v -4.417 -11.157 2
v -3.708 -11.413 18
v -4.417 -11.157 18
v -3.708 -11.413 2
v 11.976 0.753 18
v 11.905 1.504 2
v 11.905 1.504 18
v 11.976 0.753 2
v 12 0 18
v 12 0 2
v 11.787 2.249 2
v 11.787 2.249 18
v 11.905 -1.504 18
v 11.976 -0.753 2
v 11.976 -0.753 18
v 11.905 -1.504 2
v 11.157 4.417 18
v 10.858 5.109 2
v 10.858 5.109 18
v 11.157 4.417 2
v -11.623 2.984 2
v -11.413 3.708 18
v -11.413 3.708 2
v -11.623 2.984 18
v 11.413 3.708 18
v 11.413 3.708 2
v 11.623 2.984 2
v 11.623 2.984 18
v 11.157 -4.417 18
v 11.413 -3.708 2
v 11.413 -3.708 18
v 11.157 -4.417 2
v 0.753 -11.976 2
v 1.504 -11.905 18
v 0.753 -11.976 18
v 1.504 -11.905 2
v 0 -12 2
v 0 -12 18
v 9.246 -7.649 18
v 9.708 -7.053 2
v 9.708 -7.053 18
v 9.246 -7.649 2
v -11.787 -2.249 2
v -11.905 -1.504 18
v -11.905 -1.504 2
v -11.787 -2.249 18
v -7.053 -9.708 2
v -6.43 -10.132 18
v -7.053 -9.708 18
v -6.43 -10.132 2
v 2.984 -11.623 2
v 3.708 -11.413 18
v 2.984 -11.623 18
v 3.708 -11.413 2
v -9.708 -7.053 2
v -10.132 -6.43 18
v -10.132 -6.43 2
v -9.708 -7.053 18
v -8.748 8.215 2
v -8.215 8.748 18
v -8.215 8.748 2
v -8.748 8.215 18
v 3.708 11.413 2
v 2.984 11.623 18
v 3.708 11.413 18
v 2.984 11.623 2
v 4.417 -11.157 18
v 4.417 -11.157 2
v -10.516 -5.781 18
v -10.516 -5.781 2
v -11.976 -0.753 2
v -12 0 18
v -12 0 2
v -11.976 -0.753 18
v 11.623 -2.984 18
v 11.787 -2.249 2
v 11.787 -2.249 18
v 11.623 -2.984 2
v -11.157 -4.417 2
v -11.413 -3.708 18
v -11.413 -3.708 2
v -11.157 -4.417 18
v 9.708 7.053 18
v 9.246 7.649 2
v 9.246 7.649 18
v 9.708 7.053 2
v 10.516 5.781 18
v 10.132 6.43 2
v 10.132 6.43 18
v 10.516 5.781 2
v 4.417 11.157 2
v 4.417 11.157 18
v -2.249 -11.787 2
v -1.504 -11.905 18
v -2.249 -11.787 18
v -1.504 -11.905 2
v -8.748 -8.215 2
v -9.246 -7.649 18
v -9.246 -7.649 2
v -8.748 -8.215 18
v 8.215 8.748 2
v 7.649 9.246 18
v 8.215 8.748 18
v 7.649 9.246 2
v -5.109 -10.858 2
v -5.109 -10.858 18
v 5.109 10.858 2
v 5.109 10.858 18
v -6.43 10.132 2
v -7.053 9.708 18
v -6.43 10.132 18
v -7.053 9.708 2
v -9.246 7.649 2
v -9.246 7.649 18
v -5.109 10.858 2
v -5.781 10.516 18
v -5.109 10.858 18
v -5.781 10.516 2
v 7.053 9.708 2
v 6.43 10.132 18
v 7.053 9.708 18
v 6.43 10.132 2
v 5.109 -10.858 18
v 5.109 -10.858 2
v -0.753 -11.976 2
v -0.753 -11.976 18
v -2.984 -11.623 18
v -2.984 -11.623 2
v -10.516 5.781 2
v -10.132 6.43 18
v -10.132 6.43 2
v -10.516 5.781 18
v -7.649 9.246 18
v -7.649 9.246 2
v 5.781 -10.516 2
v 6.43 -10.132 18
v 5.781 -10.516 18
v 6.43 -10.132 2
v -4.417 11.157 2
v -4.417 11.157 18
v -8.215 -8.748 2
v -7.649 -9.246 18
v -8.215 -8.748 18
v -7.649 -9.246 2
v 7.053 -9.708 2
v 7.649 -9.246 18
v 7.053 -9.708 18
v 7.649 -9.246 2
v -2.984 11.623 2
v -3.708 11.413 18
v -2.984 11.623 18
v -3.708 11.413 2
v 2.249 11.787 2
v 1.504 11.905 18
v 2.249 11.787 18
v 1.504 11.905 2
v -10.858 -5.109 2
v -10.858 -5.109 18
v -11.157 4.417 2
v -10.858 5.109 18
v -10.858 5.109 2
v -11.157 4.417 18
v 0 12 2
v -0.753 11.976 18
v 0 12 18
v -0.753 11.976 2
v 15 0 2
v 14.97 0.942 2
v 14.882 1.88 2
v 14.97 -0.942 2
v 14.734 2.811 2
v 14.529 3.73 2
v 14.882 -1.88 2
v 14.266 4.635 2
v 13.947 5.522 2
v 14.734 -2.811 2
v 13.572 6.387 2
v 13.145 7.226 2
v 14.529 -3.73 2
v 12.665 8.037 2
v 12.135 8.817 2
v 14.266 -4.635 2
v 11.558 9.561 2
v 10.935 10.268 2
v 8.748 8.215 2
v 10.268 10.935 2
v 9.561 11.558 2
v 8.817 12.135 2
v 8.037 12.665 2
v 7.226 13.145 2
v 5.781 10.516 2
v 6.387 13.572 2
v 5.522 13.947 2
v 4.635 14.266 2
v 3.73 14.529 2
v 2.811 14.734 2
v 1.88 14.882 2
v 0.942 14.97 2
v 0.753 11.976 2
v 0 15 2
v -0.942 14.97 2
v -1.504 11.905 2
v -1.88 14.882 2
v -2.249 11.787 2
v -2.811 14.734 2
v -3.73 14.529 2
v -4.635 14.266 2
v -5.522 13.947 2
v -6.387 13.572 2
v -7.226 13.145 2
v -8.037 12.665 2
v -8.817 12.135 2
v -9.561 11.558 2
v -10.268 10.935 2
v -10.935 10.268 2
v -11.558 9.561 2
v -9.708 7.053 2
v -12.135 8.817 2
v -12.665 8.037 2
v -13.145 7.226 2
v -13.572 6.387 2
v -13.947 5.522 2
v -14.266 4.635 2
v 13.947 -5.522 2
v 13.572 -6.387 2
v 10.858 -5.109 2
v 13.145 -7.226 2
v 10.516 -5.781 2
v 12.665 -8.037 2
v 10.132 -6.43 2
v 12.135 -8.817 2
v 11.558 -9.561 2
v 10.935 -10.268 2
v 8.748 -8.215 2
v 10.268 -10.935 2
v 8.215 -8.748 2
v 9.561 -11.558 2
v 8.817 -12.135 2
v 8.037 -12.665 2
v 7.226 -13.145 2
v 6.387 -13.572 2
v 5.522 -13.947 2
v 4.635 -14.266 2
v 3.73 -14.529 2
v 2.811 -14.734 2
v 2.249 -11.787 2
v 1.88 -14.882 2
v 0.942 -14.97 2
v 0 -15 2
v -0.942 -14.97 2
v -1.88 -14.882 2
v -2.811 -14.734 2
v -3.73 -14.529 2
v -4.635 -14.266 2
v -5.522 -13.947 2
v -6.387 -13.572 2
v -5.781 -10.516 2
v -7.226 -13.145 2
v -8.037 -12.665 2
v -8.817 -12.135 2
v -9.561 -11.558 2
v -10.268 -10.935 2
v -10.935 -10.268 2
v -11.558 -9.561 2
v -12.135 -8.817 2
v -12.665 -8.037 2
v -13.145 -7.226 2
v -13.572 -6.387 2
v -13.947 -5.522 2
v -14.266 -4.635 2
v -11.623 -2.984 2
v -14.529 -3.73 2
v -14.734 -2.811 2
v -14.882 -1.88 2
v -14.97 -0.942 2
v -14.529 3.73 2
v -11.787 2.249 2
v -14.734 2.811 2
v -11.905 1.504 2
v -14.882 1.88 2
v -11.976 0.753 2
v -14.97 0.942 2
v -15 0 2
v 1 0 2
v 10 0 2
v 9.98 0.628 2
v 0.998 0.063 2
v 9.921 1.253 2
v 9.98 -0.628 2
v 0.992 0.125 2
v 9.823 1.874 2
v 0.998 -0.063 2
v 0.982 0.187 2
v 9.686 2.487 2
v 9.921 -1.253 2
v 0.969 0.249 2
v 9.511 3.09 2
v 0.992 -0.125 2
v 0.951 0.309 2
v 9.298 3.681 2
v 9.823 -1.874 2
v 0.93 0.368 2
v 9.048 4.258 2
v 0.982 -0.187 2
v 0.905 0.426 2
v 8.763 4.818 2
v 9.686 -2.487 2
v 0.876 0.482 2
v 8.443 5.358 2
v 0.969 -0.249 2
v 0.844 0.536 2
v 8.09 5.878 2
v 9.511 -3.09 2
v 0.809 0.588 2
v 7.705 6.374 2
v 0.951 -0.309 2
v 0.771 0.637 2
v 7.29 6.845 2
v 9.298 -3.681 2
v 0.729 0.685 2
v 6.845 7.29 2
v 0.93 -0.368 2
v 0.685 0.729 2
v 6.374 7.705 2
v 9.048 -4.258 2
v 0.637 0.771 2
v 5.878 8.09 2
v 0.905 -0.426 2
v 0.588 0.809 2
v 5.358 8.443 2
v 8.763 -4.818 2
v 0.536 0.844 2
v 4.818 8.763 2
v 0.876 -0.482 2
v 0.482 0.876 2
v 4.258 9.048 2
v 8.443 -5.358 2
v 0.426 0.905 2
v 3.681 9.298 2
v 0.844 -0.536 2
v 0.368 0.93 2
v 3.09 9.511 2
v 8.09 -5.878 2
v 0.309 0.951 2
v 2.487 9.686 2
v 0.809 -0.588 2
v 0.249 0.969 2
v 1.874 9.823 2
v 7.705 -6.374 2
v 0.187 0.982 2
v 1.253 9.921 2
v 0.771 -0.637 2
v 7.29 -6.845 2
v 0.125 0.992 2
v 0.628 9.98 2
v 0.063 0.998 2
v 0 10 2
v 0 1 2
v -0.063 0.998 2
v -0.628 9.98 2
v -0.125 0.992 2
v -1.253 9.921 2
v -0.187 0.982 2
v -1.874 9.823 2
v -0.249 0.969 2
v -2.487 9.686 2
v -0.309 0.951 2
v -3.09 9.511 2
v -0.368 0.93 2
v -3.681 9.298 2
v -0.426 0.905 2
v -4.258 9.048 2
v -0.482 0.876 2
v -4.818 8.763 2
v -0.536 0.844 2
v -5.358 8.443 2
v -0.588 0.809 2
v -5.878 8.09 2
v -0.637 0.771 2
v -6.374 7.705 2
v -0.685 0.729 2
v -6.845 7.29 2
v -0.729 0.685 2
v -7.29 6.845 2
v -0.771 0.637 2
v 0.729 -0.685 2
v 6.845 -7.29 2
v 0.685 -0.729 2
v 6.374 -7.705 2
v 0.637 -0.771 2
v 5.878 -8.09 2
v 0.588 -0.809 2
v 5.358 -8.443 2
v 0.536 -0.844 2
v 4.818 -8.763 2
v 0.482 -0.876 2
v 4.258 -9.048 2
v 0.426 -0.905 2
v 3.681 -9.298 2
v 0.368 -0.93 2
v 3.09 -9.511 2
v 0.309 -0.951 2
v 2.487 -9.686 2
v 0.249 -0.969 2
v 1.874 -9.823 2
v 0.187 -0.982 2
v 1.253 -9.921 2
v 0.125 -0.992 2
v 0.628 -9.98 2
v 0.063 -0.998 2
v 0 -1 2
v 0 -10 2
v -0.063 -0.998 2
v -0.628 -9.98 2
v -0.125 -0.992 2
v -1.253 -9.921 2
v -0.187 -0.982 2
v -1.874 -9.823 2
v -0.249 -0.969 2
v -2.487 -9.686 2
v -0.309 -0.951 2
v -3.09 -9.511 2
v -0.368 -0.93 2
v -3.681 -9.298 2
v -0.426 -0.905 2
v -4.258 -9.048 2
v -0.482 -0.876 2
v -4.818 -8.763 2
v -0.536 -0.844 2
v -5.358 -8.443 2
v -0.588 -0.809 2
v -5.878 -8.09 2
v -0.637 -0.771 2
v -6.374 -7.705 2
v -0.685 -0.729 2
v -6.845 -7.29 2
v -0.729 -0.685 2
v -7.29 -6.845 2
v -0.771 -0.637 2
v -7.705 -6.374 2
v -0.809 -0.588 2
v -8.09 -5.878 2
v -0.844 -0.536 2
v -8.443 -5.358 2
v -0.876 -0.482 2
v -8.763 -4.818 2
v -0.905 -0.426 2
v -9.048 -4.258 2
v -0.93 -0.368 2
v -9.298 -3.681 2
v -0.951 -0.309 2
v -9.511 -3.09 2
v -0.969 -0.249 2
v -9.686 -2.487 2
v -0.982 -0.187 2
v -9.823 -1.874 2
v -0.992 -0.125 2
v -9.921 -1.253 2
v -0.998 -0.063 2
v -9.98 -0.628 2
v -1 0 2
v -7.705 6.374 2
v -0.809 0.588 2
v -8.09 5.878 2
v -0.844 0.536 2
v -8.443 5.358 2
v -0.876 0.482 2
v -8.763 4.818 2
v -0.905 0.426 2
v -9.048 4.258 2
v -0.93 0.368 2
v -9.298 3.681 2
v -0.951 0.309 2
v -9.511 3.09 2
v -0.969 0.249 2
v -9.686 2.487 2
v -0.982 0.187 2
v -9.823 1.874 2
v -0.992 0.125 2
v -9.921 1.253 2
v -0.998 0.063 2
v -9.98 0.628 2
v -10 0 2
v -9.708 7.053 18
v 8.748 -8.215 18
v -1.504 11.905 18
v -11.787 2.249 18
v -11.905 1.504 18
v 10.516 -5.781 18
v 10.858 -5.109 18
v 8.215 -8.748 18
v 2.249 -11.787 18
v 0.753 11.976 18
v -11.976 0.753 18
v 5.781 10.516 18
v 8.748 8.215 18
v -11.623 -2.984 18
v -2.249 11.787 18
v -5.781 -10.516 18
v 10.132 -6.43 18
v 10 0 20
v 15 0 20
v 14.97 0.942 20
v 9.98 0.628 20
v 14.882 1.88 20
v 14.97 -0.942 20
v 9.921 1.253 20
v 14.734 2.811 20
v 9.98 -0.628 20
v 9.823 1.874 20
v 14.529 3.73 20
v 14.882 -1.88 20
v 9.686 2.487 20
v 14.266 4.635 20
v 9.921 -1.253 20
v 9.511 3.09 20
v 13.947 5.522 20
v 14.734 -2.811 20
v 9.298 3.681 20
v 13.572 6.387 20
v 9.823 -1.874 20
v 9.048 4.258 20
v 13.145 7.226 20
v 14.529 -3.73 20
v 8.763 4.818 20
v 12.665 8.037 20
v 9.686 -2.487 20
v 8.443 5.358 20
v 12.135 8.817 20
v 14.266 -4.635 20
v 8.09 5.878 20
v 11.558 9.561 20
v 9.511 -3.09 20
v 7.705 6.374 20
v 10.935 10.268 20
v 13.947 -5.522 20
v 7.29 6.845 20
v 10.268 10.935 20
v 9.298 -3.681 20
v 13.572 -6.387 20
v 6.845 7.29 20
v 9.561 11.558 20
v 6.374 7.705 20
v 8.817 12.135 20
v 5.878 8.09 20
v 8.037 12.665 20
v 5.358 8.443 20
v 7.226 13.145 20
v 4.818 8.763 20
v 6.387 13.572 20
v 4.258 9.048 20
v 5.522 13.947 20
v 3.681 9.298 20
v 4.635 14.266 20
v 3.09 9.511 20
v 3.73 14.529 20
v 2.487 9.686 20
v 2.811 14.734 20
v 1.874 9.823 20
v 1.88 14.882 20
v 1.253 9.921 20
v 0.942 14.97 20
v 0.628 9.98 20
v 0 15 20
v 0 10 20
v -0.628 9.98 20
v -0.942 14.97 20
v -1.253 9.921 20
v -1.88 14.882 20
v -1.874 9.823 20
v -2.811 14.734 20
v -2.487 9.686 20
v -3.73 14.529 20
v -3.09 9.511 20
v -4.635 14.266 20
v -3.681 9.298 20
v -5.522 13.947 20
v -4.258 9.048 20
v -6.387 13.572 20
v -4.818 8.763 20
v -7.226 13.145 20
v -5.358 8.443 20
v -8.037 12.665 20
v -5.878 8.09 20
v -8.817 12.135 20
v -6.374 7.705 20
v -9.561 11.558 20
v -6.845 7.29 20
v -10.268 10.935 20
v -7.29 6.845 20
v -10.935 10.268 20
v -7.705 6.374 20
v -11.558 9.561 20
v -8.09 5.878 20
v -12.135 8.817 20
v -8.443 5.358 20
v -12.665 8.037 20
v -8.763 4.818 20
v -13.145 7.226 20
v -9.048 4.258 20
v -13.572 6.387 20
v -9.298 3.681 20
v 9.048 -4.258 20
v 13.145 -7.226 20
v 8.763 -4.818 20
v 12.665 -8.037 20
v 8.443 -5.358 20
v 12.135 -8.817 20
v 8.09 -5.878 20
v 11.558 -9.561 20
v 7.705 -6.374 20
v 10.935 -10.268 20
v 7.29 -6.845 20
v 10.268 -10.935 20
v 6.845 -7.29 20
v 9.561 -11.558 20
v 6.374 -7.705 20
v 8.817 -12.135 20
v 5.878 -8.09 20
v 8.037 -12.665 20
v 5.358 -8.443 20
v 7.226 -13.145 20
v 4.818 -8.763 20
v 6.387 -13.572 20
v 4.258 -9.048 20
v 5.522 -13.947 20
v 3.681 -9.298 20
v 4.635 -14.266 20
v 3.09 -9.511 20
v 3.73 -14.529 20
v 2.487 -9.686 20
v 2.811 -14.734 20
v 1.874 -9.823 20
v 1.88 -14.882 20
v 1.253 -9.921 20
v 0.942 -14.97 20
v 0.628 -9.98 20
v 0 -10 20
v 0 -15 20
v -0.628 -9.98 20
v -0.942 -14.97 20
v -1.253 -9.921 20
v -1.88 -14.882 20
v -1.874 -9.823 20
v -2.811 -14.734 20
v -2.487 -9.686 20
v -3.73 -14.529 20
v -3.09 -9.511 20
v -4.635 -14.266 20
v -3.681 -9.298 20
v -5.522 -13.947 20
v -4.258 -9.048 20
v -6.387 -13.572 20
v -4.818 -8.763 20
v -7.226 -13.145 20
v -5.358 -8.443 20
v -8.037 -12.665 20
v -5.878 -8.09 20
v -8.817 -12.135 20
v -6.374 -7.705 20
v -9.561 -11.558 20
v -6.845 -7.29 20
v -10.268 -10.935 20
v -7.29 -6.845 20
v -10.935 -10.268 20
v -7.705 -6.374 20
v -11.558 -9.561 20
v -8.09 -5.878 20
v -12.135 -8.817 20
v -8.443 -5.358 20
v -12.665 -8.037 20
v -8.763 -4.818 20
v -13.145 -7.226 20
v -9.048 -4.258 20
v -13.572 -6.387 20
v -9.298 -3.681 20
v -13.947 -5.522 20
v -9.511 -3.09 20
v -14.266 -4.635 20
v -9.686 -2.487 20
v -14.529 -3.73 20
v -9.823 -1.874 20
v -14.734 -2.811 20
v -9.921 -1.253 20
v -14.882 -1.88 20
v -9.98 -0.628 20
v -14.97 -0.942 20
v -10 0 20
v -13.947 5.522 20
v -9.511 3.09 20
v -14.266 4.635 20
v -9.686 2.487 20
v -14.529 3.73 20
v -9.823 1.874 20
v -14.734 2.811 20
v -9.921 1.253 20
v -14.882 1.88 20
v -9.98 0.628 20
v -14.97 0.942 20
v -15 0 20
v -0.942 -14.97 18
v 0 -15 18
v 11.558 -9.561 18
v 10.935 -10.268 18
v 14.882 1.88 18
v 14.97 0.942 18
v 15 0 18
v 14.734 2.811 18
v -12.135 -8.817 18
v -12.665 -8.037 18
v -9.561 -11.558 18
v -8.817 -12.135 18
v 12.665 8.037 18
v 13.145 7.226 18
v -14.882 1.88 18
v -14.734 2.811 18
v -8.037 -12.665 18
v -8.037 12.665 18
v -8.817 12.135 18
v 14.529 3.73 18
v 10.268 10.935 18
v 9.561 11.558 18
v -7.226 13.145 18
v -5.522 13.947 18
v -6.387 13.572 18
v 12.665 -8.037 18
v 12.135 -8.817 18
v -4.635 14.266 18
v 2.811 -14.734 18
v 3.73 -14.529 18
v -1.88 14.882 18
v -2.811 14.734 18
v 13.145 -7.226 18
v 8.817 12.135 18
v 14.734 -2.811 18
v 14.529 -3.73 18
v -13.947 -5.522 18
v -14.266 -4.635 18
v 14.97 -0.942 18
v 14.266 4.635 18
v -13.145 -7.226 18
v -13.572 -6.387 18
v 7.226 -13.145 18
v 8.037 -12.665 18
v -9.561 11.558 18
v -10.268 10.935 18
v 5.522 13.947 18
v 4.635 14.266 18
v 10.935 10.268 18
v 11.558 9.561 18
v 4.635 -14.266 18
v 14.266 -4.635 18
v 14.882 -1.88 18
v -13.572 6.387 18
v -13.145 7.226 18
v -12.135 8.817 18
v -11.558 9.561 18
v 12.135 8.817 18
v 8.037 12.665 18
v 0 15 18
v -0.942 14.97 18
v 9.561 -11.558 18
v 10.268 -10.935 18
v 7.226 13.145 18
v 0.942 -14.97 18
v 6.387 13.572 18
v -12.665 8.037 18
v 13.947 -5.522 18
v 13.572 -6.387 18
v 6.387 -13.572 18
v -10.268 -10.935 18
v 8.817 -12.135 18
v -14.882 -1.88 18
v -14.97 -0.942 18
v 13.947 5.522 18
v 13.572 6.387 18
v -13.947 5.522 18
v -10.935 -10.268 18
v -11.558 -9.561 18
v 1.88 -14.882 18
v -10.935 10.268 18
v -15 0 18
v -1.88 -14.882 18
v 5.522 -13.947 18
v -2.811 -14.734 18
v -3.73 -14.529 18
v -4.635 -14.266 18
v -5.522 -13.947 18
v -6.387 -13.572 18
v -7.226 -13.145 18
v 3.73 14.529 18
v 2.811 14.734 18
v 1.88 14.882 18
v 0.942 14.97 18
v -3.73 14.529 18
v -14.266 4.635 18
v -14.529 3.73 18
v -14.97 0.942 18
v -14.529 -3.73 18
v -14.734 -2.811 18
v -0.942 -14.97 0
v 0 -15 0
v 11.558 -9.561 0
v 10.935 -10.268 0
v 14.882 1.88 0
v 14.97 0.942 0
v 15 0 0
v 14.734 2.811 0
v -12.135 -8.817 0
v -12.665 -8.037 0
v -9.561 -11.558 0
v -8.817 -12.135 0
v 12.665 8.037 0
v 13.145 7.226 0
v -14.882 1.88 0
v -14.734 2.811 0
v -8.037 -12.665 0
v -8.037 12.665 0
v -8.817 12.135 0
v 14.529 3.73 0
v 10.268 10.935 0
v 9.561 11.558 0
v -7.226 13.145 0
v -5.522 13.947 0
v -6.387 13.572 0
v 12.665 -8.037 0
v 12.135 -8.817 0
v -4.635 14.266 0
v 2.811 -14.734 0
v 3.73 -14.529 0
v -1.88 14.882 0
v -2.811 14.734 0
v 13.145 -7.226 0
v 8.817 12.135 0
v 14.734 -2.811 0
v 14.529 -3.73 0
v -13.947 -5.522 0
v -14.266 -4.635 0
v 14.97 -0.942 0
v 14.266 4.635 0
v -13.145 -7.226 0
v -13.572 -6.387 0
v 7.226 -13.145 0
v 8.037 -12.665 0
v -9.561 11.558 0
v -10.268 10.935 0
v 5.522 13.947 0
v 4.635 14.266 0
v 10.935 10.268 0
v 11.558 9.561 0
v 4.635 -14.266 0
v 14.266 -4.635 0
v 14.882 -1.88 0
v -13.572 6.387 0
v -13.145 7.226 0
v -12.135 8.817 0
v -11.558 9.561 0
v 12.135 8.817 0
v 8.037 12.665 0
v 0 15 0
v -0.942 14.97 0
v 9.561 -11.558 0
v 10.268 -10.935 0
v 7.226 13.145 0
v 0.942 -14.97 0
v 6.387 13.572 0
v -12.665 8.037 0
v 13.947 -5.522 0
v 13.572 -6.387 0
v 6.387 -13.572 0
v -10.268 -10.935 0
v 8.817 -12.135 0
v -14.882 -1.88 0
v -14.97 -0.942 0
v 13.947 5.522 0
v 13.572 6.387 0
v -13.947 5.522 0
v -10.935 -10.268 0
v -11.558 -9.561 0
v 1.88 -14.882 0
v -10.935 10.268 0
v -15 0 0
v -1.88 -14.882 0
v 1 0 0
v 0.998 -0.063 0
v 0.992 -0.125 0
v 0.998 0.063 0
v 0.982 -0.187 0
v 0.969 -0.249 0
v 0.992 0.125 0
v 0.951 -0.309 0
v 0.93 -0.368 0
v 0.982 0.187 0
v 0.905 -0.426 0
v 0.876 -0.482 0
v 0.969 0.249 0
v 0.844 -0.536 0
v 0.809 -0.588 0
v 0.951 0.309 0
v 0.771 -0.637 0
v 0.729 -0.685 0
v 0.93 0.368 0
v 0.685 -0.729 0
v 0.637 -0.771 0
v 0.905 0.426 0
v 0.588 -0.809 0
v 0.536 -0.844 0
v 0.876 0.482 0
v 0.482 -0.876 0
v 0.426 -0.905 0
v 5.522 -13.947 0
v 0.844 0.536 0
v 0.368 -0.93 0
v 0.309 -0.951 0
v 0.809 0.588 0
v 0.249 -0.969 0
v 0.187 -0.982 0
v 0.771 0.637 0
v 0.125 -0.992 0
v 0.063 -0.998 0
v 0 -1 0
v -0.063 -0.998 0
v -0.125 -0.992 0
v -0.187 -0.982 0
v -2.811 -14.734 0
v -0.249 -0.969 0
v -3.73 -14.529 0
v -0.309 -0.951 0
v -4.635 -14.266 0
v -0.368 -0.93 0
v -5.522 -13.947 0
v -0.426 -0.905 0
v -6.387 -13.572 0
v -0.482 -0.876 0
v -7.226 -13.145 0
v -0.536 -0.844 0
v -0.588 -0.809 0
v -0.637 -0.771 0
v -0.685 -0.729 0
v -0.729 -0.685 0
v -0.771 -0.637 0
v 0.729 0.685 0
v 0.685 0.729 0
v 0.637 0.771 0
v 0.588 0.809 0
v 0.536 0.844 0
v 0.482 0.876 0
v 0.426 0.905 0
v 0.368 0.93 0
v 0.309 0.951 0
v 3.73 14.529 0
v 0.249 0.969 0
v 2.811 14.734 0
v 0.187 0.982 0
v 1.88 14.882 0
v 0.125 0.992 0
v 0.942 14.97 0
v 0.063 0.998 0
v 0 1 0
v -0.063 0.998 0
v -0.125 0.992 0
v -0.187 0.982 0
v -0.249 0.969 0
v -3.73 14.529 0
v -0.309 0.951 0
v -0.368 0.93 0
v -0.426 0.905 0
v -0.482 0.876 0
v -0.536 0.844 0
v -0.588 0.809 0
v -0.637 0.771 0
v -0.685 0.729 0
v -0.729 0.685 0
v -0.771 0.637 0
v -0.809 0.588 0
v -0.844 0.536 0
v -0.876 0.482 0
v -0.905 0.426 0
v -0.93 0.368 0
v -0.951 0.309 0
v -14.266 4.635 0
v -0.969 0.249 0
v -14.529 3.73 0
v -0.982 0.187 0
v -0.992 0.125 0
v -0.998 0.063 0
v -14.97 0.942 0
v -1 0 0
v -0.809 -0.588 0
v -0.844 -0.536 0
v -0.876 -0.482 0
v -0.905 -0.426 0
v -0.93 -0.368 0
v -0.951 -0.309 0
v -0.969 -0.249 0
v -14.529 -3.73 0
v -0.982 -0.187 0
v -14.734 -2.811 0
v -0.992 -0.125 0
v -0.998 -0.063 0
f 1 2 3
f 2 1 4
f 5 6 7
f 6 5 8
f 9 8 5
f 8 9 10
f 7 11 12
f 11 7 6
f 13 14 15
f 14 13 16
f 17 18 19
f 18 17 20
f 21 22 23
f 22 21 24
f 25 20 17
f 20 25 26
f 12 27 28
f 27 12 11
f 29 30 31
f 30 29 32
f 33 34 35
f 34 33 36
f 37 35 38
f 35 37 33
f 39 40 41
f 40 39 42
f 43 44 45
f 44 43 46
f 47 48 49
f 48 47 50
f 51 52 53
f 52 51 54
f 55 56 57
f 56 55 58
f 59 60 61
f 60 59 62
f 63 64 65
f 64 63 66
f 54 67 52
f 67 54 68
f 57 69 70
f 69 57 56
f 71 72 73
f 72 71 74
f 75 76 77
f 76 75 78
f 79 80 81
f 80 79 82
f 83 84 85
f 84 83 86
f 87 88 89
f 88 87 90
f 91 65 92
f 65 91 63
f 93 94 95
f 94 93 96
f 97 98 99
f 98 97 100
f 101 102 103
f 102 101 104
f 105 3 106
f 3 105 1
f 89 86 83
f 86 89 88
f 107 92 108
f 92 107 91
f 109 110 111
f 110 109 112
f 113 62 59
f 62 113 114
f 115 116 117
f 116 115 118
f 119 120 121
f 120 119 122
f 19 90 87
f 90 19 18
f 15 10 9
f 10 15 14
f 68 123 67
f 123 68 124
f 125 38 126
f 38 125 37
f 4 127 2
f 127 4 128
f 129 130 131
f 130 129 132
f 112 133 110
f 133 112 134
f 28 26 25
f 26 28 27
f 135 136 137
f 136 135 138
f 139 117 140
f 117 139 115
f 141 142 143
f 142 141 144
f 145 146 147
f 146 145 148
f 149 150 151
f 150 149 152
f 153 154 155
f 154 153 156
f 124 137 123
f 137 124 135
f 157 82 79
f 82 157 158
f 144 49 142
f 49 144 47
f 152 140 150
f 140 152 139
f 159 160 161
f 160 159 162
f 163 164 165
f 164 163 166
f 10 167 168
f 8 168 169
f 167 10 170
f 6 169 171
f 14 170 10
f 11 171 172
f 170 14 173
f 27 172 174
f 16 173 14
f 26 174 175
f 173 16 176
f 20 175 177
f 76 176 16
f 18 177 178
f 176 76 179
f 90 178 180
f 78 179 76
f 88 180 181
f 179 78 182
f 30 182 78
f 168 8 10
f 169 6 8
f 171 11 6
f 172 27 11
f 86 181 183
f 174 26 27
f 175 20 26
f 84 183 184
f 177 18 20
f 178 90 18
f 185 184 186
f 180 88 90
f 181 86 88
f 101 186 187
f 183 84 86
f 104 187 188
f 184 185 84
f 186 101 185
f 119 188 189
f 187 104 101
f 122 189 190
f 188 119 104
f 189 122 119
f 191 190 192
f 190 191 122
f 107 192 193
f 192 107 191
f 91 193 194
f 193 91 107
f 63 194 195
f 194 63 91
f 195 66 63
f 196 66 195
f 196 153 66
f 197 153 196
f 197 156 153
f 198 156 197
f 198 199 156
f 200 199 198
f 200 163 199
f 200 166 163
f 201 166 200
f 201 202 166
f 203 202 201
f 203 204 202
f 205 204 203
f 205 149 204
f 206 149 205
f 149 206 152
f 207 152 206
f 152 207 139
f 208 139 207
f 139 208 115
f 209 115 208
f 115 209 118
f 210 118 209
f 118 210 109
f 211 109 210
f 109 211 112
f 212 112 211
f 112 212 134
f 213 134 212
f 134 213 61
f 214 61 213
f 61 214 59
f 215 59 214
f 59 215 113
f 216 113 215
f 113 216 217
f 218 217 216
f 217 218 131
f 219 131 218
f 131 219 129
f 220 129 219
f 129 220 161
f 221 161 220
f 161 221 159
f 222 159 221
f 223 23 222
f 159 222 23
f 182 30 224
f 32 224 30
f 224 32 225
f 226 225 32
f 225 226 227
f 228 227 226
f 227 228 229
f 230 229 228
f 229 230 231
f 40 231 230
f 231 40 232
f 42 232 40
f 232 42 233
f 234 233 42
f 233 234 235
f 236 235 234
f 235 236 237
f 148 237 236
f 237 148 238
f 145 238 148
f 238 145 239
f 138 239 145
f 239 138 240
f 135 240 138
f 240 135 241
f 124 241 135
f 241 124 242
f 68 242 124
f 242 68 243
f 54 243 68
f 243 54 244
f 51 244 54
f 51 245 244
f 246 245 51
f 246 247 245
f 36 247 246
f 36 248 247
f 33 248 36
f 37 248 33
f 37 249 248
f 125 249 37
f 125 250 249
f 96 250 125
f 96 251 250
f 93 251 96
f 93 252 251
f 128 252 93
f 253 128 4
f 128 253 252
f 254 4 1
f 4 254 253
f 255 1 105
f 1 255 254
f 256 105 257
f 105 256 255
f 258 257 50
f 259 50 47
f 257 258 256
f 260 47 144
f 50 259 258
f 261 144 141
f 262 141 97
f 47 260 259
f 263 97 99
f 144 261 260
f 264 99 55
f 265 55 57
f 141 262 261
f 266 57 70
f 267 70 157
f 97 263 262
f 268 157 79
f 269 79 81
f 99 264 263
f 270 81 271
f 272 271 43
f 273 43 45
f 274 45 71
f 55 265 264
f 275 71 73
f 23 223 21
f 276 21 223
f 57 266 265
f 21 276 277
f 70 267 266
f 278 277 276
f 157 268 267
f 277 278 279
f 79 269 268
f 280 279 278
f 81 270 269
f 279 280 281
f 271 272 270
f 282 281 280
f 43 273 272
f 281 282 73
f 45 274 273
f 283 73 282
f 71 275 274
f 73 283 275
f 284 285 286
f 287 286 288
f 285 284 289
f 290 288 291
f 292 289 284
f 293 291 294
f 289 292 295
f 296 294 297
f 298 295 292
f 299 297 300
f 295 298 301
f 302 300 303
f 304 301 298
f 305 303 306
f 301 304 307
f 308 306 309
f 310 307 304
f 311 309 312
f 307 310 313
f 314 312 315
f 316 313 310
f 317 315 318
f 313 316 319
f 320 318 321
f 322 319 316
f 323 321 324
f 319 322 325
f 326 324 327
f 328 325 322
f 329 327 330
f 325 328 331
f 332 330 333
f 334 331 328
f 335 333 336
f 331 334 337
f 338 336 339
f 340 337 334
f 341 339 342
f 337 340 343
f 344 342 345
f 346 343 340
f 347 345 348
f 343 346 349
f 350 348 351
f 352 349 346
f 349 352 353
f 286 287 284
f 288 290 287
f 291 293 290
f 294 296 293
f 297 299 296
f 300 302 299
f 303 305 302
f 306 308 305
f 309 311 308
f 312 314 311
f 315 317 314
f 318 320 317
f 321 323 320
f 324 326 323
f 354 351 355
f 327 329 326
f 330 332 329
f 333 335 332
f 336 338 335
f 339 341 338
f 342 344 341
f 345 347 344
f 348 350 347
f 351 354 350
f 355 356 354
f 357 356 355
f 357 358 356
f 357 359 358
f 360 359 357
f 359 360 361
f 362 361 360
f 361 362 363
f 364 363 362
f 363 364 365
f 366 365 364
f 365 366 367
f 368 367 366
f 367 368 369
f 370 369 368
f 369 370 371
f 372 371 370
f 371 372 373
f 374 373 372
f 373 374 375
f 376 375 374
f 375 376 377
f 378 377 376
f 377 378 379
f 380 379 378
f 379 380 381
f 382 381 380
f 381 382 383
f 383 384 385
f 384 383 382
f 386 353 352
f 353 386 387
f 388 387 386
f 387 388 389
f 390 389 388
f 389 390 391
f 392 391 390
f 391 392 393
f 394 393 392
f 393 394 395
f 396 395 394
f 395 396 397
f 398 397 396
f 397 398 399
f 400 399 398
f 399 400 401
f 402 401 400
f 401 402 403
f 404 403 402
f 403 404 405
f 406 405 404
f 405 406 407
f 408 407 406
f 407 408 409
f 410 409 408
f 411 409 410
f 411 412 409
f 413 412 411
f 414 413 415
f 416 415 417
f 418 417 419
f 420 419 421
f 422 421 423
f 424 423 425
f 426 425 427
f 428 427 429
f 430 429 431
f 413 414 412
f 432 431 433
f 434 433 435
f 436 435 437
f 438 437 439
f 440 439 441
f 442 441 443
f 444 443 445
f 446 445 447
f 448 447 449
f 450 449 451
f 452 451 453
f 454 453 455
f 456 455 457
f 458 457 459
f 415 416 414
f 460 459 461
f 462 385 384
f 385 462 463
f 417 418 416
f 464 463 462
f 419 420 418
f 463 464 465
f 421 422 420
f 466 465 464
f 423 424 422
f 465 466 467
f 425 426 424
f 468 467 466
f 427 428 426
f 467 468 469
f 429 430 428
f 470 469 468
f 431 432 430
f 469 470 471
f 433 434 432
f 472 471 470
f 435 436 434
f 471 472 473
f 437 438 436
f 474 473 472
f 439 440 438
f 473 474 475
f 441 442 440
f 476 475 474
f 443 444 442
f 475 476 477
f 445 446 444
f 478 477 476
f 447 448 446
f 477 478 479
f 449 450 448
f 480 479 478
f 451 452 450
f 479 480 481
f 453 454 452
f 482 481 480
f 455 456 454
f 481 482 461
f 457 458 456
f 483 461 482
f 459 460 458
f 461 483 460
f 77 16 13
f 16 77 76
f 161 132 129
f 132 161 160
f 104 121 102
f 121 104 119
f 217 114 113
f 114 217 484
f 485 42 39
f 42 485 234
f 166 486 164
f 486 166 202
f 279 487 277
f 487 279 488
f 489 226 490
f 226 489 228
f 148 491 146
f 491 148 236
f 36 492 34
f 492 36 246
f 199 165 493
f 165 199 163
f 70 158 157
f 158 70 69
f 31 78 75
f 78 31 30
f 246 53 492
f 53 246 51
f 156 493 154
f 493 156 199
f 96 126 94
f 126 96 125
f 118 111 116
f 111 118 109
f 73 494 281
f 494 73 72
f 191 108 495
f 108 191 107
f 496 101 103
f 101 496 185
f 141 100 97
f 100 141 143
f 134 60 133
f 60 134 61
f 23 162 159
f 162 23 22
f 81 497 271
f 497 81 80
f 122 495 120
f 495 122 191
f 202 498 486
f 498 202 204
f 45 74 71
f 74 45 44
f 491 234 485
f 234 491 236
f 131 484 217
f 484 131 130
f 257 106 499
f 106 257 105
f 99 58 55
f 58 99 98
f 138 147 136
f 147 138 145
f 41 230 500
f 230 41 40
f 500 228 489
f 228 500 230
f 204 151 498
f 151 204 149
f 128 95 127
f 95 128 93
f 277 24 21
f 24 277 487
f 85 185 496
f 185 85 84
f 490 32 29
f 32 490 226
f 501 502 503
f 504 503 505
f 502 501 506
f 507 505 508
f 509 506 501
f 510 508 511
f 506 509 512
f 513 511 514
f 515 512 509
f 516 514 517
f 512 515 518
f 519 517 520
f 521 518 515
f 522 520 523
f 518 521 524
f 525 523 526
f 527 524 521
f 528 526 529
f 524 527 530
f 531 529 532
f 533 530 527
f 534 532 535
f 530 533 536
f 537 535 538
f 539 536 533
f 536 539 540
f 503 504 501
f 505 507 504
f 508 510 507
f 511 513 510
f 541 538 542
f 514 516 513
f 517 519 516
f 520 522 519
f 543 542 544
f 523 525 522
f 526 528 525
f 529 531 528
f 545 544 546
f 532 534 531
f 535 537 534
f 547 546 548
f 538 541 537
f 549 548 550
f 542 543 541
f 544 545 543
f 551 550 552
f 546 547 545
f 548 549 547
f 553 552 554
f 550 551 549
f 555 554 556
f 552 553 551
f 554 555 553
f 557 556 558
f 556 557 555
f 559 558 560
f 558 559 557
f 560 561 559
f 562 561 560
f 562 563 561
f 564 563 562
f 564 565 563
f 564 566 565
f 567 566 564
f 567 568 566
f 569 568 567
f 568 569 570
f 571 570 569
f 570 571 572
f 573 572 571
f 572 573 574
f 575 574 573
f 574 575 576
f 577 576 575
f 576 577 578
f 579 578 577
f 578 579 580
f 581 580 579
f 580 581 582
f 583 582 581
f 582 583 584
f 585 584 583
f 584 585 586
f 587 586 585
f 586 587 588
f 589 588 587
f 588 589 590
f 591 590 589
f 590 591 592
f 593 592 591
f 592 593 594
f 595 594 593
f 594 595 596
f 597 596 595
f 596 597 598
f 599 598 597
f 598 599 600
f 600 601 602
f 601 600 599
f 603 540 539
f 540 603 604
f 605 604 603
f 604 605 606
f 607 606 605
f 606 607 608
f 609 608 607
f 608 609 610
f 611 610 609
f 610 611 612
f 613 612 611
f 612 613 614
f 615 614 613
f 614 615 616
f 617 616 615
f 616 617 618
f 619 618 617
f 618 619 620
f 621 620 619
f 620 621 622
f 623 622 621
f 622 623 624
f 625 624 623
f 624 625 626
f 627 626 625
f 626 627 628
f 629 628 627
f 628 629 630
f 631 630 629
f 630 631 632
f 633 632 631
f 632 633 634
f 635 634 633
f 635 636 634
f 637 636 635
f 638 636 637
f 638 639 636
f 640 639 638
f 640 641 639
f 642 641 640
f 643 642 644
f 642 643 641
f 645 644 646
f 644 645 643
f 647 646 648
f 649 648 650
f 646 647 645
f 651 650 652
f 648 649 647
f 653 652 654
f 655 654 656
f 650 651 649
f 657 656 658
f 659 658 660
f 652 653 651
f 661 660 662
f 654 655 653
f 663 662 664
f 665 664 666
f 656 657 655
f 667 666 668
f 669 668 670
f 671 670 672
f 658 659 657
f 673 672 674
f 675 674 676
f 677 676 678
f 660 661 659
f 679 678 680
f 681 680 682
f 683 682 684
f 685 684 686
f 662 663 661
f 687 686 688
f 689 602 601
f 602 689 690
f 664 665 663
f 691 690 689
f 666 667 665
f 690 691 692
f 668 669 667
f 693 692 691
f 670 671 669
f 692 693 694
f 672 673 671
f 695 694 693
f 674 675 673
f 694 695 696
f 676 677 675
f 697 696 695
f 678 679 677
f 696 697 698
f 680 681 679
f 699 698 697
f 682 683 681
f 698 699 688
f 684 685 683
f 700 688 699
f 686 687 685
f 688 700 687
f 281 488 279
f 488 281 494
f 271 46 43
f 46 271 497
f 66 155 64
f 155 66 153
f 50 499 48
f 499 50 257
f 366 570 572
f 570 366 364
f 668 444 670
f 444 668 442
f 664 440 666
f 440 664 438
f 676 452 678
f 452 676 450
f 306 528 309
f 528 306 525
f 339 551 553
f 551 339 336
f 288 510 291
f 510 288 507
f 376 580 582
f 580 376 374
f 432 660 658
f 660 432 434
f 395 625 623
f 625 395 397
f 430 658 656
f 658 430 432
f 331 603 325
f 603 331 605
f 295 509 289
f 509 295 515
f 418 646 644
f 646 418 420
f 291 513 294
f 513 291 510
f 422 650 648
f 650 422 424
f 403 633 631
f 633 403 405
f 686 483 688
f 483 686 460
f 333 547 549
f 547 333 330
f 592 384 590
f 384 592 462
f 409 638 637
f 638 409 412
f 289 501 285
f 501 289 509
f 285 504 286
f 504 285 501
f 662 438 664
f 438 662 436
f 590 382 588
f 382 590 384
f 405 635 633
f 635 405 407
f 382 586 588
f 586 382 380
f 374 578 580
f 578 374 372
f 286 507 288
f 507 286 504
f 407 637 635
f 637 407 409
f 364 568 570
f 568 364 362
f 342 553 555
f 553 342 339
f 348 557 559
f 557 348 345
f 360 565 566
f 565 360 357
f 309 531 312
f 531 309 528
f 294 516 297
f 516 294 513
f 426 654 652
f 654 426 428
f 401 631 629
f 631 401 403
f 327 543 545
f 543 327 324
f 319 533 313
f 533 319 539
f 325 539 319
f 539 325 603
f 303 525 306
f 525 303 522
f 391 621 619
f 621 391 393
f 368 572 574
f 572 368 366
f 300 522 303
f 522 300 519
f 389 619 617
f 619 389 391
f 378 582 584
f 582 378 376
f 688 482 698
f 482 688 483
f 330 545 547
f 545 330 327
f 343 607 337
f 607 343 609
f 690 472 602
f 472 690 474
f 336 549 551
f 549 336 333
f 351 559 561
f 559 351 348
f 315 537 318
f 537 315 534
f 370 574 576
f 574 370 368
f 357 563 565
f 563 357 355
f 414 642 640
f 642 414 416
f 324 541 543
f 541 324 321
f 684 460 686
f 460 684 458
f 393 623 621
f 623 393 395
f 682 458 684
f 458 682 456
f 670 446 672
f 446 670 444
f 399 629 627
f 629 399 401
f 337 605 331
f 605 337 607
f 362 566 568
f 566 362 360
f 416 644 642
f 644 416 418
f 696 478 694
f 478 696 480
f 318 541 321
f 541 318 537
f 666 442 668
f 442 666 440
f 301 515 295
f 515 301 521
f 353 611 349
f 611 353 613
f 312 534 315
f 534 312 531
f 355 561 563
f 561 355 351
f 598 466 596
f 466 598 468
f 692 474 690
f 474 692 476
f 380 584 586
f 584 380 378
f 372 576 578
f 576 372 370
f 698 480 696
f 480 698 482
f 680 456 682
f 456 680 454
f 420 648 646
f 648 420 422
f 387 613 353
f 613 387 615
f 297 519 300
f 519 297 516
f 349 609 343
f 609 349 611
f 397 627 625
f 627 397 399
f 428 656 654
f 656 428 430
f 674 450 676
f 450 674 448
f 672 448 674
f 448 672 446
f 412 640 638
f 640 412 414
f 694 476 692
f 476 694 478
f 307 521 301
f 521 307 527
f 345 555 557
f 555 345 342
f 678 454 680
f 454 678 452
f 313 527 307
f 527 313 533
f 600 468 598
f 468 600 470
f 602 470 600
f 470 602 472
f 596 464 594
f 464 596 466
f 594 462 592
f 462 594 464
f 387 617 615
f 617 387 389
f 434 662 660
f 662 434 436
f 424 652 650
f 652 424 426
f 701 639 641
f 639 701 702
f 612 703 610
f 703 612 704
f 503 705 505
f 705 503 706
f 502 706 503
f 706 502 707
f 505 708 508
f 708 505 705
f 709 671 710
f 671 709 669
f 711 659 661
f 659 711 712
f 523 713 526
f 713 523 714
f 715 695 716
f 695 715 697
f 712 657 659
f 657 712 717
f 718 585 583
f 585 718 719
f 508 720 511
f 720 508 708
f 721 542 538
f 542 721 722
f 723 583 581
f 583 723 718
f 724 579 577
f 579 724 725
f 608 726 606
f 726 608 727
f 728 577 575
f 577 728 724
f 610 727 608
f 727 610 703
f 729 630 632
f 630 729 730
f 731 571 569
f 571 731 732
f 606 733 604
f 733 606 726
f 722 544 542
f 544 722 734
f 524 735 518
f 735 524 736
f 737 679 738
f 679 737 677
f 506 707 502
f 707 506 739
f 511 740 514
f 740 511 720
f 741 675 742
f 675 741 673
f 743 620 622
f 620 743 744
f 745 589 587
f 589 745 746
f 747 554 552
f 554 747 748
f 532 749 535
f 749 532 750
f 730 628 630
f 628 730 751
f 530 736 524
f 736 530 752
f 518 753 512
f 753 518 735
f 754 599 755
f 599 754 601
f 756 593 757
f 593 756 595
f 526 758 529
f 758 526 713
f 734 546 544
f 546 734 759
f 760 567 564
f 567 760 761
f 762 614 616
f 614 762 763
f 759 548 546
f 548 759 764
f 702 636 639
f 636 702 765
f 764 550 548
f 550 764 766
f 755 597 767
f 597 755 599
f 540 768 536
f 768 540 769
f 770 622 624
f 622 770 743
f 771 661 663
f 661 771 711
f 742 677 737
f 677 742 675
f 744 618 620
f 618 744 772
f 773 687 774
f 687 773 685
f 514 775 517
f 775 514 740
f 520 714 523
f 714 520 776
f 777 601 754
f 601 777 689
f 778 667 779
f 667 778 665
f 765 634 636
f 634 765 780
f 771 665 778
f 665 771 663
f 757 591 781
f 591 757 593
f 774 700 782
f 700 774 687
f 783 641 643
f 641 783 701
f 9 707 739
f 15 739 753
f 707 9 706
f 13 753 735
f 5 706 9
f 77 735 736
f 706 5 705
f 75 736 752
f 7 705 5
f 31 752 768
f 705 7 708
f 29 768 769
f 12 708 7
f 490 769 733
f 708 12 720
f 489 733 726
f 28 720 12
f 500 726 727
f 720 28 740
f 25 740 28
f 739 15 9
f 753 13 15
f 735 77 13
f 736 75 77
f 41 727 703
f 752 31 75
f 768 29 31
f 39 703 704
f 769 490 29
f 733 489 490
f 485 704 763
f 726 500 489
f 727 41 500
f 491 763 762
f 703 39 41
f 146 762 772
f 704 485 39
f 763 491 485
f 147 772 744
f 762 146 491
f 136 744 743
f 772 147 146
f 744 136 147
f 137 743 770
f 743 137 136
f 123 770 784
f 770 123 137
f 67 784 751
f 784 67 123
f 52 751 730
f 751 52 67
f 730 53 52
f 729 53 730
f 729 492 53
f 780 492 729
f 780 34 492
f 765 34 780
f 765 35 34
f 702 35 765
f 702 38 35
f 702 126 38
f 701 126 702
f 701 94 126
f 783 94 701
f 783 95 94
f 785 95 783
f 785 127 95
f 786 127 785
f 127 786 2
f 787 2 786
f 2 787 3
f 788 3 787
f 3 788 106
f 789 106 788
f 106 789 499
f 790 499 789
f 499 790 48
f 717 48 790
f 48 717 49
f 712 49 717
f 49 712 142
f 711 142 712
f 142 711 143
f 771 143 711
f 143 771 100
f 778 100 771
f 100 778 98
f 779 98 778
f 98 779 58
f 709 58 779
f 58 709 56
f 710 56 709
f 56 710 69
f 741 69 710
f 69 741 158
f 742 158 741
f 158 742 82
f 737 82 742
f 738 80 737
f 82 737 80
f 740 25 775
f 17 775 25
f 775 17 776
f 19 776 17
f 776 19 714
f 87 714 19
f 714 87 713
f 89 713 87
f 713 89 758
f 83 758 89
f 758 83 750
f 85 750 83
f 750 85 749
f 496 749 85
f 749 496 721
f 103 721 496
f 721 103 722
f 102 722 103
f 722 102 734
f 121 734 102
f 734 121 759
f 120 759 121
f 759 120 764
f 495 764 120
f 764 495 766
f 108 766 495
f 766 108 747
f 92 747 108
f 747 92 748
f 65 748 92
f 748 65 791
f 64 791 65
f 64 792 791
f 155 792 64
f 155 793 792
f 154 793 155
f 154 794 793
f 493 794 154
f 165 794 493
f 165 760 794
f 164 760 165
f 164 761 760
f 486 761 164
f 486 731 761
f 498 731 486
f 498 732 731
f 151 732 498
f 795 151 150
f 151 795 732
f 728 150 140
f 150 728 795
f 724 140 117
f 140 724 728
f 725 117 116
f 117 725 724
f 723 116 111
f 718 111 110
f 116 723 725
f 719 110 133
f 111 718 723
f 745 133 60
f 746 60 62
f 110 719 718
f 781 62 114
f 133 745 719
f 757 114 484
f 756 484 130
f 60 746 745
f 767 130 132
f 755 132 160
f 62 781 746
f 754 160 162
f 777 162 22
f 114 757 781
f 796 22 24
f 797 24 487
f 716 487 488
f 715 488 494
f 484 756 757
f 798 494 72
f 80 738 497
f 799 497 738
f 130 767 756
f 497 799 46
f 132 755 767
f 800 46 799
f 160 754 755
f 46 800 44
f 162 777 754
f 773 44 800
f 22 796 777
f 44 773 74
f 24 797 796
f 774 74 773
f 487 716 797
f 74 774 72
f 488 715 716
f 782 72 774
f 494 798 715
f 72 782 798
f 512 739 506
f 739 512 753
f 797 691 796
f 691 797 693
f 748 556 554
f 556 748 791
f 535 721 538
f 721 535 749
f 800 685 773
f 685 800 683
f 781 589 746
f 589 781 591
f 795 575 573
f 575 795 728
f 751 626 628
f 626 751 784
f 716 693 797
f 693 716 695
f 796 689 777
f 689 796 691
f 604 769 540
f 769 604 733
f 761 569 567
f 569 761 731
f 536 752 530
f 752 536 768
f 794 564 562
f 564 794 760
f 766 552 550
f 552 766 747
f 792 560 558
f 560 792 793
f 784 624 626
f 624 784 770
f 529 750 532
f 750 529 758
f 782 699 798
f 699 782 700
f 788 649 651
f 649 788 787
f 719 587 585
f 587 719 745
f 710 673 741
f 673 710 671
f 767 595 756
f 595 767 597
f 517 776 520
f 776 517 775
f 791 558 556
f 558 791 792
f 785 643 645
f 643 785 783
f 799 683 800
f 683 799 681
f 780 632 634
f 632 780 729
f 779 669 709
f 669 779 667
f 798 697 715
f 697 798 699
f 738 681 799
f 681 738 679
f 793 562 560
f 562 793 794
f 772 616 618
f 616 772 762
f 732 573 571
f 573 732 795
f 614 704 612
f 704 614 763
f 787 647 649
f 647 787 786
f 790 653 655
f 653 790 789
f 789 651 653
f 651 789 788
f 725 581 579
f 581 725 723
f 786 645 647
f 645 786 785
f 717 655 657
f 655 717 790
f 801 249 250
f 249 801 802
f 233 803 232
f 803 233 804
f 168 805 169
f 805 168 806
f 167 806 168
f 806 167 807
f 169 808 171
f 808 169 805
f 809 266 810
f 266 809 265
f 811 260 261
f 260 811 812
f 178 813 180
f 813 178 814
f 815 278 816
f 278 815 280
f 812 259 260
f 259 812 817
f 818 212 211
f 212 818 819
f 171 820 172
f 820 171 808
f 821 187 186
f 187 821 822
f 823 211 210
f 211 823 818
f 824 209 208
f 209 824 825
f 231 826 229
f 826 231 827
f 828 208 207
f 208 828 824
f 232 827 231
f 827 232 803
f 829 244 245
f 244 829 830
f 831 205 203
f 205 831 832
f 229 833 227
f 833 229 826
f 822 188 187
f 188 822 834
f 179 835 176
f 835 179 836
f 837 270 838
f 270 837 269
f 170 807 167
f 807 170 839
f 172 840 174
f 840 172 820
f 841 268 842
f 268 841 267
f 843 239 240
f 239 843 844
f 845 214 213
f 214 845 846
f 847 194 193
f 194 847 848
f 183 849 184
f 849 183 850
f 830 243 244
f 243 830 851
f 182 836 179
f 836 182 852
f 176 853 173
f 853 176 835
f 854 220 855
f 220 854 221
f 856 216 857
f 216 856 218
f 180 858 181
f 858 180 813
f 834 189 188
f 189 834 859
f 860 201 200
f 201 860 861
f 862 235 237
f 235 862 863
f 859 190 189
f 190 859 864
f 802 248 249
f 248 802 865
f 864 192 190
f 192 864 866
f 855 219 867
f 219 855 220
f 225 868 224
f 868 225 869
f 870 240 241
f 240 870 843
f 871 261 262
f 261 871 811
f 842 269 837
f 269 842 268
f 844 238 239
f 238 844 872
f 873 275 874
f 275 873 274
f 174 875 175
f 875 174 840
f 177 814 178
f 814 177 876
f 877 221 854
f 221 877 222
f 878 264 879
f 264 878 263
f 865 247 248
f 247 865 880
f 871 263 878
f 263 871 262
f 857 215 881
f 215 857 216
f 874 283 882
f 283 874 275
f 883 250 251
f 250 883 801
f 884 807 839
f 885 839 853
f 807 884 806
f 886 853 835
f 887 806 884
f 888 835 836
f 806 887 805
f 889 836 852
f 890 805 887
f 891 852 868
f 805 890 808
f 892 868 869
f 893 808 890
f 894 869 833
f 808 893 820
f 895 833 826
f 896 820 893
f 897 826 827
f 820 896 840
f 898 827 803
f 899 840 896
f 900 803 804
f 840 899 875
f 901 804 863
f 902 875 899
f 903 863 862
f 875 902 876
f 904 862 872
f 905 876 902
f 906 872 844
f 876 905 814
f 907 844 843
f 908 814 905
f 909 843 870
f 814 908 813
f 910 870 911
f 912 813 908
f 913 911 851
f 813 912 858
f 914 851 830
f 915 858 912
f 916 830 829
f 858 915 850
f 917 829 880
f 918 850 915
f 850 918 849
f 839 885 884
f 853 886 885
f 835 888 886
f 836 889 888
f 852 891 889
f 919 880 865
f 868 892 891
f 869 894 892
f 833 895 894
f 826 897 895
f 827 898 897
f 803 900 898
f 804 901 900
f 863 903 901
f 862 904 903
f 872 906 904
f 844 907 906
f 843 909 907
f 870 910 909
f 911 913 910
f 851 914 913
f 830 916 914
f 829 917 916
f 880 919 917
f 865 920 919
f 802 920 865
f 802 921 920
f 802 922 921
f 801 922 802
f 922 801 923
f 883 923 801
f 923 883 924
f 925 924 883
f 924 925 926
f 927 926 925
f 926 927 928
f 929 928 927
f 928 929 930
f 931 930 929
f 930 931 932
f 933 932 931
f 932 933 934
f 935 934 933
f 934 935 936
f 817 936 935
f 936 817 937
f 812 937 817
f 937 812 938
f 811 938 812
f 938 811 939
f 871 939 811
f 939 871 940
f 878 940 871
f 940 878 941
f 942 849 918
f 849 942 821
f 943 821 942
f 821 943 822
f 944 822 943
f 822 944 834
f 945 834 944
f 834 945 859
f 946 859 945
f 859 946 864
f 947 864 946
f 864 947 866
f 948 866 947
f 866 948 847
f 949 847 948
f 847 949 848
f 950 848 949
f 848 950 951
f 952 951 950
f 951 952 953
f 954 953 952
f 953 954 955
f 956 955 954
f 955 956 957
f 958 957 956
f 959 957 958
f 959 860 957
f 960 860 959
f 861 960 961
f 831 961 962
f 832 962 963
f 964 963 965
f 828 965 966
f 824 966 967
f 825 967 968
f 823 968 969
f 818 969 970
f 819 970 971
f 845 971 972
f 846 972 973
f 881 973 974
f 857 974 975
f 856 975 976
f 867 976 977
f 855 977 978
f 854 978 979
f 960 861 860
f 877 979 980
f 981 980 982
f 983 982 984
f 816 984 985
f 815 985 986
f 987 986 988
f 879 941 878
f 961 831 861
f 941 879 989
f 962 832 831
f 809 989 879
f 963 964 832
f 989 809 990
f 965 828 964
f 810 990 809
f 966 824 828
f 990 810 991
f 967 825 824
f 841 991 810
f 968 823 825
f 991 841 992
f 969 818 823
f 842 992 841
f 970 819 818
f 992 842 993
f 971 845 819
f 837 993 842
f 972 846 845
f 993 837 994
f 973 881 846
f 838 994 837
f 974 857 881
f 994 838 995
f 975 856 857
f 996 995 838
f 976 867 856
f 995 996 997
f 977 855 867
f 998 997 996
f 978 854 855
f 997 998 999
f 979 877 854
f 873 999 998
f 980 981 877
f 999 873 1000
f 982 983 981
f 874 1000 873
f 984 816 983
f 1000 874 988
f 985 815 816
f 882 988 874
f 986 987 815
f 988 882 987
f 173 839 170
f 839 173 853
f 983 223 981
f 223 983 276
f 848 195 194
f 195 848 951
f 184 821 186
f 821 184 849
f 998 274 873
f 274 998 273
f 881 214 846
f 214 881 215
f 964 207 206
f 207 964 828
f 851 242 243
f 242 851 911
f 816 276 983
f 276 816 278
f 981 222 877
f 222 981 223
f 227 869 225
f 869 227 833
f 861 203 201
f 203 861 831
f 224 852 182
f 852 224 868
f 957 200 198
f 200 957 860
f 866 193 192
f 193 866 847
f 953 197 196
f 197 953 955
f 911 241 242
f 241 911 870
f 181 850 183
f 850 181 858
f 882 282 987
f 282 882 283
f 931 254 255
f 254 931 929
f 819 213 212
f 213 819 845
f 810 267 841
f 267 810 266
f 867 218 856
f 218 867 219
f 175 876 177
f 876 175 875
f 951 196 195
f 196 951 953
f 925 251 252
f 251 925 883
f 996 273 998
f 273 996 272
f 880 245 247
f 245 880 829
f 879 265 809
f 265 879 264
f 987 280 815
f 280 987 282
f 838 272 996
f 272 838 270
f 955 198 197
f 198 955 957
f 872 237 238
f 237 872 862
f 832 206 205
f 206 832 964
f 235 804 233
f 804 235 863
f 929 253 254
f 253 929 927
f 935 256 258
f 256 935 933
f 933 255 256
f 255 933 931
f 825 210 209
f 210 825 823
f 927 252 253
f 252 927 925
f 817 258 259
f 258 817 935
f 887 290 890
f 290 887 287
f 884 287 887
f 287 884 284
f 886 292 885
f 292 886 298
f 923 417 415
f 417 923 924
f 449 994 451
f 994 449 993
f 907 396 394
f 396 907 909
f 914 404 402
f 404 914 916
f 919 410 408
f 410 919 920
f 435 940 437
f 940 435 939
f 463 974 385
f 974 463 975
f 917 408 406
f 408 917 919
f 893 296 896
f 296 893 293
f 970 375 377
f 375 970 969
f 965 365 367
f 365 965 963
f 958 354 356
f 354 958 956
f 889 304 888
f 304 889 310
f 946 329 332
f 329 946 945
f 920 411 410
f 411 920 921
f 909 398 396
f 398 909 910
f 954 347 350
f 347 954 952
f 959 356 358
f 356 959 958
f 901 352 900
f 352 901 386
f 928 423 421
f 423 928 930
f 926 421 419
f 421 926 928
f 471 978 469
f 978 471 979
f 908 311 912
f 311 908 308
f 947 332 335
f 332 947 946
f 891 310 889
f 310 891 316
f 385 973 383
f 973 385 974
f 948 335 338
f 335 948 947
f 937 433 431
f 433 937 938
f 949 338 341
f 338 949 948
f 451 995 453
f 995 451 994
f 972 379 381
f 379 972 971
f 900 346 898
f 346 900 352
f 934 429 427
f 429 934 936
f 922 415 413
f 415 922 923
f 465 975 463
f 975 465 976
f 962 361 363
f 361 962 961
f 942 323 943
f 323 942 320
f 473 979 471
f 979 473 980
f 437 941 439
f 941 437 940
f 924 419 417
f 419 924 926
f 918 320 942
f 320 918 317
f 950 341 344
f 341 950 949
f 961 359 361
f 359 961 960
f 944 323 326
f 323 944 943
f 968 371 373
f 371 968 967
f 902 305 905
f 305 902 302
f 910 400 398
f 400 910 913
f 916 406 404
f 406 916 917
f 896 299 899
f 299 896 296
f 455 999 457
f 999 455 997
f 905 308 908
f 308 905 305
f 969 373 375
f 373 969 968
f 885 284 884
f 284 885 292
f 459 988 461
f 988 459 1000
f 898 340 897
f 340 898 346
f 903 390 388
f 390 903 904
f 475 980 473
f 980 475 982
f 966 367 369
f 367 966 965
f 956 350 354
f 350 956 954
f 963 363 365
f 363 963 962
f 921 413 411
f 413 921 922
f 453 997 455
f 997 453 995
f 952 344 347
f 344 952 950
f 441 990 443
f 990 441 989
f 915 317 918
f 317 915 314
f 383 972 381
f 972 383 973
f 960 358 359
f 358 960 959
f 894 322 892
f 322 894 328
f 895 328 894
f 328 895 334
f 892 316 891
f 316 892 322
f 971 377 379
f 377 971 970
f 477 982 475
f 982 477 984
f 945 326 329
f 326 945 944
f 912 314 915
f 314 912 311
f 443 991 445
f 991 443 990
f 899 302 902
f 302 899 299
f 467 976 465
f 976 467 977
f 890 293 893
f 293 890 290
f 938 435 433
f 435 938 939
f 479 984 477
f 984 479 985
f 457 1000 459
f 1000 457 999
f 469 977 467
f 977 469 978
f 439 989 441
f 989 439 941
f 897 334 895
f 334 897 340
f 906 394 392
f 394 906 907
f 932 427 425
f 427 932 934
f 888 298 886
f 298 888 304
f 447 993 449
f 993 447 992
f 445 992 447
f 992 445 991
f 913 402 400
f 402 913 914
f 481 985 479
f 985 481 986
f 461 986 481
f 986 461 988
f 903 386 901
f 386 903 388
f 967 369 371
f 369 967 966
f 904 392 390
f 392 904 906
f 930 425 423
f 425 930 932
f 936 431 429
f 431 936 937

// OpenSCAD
translate([0,0,2])
difference(){
        cylinder(h=18,d=24,$fn=100);
        cylinder(h=20.1,d=20,$fn=100);
    }
    
translate([0,0,18])
difference(){
        cylinder(h=2,d=30,$fn=100);
        cylinder(h=20.1,d=20,$fn=100);
    }
//translate([0,0,2]);
//    cylinder(h=18,d=20,$fn=100);

difference(){
    cylinder(h=2,d=30,$fn=100);
    translate([0,0,-1])
        cylinder(h=30,d=2,$fn=100);
}

    
